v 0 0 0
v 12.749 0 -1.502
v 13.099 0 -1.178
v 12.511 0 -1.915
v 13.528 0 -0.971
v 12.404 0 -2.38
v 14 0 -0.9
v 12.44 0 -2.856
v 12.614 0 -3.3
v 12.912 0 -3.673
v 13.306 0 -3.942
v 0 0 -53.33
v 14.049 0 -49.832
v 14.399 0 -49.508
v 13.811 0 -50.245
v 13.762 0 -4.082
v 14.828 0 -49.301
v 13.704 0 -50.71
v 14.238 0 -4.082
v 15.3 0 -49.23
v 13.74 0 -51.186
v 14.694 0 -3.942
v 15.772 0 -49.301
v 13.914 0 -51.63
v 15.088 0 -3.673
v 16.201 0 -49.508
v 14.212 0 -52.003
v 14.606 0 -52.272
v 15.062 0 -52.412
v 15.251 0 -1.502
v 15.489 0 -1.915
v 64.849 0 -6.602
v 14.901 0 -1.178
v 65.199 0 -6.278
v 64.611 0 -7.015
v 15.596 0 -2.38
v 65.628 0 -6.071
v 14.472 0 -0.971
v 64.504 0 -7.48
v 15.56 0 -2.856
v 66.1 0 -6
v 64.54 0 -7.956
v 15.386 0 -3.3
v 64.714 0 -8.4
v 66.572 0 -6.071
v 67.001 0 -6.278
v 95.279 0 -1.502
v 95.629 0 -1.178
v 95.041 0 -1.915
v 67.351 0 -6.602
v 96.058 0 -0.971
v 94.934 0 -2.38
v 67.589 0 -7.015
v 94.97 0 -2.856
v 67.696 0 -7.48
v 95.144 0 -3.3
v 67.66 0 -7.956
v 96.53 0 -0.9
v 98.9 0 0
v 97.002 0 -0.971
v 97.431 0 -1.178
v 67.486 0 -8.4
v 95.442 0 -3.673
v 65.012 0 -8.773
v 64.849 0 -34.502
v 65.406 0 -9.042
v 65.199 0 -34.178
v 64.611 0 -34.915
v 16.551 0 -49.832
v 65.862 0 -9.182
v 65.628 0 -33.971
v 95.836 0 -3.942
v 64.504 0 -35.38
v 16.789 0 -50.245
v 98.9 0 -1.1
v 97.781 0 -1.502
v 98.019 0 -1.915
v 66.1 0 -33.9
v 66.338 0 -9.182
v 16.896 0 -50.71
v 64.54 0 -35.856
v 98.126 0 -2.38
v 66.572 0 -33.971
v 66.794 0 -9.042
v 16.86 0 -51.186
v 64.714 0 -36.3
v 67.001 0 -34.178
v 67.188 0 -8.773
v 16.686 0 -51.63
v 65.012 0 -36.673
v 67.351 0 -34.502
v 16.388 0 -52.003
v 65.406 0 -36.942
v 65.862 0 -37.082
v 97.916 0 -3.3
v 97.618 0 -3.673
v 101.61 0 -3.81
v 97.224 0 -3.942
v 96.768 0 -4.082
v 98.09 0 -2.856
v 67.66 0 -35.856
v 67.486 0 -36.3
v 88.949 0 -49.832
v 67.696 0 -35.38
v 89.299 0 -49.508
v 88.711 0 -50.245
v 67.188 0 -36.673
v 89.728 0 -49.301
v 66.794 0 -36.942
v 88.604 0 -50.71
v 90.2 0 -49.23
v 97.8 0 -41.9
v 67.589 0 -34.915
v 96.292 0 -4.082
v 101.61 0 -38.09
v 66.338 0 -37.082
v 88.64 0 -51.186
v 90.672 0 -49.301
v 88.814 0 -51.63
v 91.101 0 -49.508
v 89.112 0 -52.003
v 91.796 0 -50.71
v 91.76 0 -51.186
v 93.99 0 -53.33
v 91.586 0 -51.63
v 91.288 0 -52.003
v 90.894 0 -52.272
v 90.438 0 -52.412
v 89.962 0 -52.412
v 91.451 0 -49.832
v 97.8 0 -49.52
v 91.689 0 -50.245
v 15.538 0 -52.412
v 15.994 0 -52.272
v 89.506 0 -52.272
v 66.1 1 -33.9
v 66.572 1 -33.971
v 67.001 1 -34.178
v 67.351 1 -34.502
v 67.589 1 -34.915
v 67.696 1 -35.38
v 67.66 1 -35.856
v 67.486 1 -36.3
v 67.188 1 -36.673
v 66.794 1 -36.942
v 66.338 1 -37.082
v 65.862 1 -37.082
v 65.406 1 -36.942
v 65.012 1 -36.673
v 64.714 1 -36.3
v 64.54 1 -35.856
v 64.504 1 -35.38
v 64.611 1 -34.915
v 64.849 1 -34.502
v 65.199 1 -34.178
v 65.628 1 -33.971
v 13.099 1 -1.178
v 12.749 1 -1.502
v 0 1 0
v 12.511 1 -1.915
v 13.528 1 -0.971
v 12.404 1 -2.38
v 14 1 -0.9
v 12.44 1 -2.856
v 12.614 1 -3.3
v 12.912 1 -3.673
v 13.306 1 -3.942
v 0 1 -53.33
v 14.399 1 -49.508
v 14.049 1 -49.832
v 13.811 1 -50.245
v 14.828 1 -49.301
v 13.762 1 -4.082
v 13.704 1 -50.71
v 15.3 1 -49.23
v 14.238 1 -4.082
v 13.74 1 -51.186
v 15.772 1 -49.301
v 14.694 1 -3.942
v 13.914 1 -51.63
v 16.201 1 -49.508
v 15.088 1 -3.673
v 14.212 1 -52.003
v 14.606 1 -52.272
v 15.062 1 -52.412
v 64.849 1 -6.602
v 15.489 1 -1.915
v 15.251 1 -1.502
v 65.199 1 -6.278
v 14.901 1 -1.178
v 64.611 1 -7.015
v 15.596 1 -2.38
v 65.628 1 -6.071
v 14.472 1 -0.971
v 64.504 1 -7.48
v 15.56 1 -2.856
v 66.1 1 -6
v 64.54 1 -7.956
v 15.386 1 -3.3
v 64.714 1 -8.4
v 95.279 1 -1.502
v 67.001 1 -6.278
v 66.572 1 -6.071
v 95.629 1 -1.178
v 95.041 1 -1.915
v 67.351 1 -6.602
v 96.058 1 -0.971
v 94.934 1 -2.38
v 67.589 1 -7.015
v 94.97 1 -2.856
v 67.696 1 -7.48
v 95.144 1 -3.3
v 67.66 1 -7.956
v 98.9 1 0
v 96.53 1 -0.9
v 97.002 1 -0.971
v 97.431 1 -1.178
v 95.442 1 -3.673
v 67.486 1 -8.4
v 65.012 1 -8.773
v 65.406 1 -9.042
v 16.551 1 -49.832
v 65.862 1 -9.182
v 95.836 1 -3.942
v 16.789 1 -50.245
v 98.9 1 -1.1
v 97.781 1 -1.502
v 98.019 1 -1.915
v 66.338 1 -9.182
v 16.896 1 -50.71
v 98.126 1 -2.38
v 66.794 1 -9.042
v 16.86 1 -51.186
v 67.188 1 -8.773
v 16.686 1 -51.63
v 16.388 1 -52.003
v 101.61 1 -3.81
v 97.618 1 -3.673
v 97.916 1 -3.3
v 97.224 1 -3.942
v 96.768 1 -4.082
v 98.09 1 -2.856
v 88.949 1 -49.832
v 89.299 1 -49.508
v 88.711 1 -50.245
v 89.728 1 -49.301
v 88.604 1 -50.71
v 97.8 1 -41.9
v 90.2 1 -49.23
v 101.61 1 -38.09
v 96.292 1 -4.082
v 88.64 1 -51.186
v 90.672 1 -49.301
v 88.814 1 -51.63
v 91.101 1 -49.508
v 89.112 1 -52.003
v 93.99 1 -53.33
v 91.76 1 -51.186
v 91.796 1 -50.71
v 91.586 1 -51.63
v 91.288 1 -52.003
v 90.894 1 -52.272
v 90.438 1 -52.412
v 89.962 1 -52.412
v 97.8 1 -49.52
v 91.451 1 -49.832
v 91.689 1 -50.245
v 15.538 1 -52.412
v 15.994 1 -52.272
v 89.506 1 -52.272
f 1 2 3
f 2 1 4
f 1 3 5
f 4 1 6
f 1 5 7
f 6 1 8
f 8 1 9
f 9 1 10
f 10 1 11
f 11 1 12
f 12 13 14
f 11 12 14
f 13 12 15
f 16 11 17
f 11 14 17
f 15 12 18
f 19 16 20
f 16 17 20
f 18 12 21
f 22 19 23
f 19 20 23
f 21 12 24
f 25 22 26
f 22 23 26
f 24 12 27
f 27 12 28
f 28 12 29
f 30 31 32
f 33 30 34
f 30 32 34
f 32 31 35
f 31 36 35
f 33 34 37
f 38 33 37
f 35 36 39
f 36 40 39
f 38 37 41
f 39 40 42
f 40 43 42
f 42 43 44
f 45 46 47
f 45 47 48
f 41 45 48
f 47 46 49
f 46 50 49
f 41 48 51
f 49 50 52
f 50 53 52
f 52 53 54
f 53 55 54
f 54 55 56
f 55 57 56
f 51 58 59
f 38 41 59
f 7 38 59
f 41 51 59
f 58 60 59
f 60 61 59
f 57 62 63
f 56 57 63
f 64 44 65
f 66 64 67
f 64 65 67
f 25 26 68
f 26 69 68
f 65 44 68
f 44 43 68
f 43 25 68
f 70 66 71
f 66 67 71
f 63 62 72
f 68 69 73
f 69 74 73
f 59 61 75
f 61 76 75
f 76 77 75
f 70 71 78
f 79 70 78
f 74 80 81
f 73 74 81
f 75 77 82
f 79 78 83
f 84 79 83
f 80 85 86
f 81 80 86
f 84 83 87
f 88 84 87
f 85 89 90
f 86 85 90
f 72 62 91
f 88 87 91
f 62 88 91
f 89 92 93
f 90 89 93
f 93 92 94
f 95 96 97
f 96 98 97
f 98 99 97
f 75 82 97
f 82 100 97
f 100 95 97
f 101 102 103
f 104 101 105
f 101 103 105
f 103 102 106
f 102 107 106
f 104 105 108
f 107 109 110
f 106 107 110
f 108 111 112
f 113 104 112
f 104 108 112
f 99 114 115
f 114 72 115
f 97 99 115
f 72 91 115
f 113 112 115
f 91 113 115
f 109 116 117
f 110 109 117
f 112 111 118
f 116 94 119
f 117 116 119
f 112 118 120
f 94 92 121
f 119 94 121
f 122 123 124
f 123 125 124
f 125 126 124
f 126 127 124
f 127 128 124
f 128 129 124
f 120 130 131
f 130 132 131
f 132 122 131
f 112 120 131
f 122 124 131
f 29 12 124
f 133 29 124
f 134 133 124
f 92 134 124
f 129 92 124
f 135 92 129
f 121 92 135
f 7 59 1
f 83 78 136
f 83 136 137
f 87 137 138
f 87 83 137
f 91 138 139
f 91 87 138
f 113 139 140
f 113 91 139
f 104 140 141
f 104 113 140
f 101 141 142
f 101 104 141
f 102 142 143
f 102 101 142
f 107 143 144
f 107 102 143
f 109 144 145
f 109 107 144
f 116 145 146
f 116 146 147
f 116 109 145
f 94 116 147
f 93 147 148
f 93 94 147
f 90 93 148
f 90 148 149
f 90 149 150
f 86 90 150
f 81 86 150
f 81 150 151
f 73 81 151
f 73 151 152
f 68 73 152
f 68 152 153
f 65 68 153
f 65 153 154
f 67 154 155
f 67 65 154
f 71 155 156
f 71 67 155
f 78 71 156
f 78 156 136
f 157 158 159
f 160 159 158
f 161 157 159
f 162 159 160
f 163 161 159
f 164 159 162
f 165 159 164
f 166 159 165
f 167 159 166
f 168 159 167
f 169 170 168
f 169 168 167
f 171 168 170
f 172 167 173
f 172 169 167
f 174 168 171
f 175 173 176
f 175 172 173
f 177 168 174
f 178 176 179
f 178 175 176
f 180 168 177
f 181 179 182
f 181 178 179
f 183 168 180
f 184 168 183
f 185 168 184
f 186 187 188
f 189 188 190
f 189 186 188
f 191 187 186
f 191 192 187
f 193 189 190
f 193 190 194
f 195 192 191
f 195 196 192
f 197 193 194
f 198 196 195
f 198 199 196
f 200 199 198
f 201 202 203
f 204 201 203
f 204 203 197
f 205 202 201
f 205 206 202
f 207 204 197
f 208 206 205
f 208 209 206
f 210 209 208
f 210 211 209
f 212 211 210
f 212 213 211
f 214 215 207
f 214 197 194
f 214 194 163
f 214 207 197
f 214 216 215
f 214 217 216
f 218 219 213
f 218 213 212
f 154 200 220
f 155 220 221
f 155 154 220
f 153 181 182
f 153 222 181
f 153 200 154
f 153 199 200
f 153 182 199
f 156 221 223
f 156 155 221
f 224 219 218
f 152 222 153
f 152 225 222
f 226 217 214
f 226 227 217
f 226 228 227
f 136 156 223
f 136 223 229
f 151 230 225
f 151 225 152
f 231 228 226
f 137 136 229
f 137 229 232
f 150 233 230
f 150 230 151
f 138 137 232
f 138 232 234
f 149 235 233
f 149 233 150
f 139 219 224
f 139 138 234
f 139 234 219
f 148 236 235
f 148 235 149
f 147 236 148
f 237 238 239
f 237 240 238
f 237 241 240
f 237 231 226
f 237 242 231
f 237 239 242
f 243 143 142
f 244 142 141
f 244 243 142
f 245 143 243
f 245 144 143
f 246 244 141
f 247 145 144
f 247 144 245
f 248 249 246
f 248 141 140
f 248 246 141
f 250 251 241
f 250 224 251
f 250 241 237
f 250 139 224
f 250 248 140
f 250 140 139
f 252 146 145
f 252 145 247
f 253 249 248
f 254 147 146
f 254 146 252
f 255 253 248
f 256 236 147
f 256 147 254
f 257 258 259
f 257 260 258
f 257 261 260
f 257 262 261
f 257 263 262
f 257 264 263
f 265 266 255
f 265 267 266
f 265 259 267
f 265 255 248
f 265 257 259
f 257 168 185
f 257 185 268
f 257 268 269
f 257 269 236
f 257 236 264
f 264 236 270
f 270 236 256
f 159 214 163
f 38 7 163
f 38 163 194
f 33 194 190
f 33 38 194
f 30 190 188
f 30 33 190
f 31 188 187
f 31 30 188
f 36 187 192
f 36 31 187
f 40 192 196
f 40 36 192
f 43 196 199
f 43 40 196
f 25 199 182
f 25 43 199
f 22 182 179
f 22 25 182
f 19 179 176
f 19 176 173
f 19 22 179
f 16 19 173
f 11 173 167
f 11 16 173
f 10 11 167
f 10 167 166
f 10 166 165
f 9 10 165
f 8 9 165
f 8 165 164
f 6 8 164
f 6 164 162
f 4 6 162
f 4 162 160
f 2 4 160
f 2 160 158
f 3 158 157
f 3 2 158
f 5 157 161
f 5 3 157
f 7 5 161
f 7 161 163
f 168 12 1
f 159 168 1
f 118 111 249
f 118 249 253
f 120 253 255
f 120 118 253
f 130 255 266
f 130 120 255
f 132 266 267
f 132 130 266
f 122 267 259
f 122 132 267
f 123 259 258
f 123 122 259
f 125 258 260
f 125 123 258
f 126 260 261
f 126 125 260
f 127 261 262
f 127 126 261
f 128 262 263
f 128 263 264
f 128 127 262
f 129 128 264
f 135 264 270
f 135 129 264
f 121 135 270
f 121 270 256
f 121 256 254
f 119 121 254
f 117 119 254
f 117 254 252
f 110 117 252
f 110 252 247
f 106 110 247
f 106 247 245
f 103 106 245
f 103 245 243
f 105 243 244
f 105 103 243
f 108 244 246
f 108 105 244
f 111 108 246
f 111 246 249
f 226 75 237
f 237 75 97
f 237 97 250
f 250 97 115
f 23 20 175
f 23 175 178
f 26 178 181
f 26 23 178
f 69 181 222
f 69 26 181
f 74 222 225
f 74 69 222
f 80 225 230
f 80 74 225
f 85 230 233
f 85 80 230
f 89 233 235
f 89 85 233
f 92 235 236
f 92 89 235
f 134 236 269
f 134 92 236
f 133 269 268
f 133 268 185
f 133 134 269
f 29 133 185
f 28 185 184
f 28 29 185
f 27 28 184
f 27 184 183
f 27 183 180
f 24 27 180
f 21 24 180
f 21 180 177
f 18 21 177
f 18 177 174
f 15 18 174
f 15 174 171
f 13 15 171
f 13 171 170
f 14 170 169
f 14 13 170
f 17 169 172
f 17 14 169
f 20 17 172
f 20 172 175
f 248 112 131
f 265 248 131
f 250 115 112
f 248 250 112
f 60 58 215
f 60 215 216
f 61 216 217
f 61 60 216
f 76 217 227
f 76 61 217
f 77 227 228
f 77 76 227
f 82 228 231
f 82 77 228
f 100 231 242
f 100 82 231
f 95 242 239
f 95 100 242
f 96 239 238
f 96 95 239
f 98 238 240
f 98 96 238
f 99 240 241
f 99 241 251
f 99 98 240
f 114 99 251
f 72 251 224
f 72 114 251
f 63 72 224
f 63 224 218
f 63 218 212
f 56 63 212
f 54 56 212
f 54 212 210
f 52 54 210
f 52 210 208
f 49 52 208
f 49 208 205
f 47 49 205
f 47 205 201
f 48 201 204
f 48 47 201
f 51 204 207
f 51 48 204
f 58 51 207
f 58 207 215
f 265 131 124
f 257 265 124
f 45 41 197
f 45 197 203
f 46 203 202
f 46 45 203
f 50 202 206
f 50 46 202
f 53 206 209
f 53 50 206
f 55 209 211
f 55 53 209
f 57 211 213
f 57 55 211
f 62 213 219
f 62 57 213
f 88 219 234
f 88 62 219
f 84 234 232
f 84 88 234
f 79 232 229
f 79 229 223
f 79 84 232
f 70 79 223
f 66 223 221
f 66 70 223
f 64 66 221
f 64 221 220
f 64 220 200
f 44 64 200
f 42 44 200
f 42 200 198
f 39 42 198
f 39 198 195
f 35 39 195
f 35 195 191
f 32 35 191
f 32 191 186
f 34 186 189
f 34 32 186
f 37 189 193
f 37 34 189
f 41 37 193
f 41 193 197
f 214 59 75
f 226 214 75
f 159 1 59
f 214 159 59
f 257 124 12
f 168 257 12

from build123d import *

# Parameters (mm, degrees)
SKETCH1_R              = 1.6
ARDUINO_TEMPLATE_DEPTH = 1


with BuildPart() as part:
    # Sketch1 → Arduino Template (new body)
    # profile 1 of 3: a face of its own
    with BuildSketch(Plane(origin=(0, 0, 0), x_dir=(1, 0, 0), z_dir=(0, 1, 0))):
        Polygon((101.61, 3.81), (101.61, 38.09), (97.8, 38.09), (97.8, 41.9), (97.8, 49.52), (93.99, 53.33), (0, 53.33), (0, 0), (97.8, 0), (98.9, 1.1), align=None)
        with Locations(Location((14, 2.5, 0), (0, 0, 270))):
            Circle(SKETCH1_R, mode=Mode.SUBTRACT)
        with Locations(Location((66.1, 7.6, 0), (0, 0, 270))):
            Circle(SKETCH1_R, mode=Mode.SUBTRACT)
        with Locations(Location((96.53, 2.5, 0), (0, 0, 270))):
            Circle(SKETCH1_R, mode=Mode.SUBTRACT)
        with Locations(Location((15.3, 50.83, 0), (0, 0, 270))):
            Circle(SKETCH1_R, mode=Mode.SUBTRACT)
        with Locations(Location((66.1, 35.5, 0), (0, 0, 270))):
            Circle(SKETCH1_R, mode=Mode.SUBTRACT)
        with Locations(Location((90.2, 50.83, 0), (0, 0, 270))):
            Circle(SKETCH1_R, mode=Mode.SUBTRACT)
    # profile 2 of 3: a face of its own
    with BuildSketch(Plane(origin=(0, 0, 0), x_dir=(1, 0, 0), z_dir=(0, 1, 0))):
        Polygon((98.9, 0), (98.9, 1.1), (97.8, 0), align=None)
    # profile 3 of 3: a face of its own
    with BuildSketch(Plane(origin=(0, 0, 0), x_dir=(1, 0, 0), z_dir=(0, 1, 0))):
        Polygon((97.8, 38.09), (101.61, 38.09), (97.8, 41.9), align=None)
    extrude(amount=ARDUINO_TEMPLATE_DEPTH)


solid = part.part
